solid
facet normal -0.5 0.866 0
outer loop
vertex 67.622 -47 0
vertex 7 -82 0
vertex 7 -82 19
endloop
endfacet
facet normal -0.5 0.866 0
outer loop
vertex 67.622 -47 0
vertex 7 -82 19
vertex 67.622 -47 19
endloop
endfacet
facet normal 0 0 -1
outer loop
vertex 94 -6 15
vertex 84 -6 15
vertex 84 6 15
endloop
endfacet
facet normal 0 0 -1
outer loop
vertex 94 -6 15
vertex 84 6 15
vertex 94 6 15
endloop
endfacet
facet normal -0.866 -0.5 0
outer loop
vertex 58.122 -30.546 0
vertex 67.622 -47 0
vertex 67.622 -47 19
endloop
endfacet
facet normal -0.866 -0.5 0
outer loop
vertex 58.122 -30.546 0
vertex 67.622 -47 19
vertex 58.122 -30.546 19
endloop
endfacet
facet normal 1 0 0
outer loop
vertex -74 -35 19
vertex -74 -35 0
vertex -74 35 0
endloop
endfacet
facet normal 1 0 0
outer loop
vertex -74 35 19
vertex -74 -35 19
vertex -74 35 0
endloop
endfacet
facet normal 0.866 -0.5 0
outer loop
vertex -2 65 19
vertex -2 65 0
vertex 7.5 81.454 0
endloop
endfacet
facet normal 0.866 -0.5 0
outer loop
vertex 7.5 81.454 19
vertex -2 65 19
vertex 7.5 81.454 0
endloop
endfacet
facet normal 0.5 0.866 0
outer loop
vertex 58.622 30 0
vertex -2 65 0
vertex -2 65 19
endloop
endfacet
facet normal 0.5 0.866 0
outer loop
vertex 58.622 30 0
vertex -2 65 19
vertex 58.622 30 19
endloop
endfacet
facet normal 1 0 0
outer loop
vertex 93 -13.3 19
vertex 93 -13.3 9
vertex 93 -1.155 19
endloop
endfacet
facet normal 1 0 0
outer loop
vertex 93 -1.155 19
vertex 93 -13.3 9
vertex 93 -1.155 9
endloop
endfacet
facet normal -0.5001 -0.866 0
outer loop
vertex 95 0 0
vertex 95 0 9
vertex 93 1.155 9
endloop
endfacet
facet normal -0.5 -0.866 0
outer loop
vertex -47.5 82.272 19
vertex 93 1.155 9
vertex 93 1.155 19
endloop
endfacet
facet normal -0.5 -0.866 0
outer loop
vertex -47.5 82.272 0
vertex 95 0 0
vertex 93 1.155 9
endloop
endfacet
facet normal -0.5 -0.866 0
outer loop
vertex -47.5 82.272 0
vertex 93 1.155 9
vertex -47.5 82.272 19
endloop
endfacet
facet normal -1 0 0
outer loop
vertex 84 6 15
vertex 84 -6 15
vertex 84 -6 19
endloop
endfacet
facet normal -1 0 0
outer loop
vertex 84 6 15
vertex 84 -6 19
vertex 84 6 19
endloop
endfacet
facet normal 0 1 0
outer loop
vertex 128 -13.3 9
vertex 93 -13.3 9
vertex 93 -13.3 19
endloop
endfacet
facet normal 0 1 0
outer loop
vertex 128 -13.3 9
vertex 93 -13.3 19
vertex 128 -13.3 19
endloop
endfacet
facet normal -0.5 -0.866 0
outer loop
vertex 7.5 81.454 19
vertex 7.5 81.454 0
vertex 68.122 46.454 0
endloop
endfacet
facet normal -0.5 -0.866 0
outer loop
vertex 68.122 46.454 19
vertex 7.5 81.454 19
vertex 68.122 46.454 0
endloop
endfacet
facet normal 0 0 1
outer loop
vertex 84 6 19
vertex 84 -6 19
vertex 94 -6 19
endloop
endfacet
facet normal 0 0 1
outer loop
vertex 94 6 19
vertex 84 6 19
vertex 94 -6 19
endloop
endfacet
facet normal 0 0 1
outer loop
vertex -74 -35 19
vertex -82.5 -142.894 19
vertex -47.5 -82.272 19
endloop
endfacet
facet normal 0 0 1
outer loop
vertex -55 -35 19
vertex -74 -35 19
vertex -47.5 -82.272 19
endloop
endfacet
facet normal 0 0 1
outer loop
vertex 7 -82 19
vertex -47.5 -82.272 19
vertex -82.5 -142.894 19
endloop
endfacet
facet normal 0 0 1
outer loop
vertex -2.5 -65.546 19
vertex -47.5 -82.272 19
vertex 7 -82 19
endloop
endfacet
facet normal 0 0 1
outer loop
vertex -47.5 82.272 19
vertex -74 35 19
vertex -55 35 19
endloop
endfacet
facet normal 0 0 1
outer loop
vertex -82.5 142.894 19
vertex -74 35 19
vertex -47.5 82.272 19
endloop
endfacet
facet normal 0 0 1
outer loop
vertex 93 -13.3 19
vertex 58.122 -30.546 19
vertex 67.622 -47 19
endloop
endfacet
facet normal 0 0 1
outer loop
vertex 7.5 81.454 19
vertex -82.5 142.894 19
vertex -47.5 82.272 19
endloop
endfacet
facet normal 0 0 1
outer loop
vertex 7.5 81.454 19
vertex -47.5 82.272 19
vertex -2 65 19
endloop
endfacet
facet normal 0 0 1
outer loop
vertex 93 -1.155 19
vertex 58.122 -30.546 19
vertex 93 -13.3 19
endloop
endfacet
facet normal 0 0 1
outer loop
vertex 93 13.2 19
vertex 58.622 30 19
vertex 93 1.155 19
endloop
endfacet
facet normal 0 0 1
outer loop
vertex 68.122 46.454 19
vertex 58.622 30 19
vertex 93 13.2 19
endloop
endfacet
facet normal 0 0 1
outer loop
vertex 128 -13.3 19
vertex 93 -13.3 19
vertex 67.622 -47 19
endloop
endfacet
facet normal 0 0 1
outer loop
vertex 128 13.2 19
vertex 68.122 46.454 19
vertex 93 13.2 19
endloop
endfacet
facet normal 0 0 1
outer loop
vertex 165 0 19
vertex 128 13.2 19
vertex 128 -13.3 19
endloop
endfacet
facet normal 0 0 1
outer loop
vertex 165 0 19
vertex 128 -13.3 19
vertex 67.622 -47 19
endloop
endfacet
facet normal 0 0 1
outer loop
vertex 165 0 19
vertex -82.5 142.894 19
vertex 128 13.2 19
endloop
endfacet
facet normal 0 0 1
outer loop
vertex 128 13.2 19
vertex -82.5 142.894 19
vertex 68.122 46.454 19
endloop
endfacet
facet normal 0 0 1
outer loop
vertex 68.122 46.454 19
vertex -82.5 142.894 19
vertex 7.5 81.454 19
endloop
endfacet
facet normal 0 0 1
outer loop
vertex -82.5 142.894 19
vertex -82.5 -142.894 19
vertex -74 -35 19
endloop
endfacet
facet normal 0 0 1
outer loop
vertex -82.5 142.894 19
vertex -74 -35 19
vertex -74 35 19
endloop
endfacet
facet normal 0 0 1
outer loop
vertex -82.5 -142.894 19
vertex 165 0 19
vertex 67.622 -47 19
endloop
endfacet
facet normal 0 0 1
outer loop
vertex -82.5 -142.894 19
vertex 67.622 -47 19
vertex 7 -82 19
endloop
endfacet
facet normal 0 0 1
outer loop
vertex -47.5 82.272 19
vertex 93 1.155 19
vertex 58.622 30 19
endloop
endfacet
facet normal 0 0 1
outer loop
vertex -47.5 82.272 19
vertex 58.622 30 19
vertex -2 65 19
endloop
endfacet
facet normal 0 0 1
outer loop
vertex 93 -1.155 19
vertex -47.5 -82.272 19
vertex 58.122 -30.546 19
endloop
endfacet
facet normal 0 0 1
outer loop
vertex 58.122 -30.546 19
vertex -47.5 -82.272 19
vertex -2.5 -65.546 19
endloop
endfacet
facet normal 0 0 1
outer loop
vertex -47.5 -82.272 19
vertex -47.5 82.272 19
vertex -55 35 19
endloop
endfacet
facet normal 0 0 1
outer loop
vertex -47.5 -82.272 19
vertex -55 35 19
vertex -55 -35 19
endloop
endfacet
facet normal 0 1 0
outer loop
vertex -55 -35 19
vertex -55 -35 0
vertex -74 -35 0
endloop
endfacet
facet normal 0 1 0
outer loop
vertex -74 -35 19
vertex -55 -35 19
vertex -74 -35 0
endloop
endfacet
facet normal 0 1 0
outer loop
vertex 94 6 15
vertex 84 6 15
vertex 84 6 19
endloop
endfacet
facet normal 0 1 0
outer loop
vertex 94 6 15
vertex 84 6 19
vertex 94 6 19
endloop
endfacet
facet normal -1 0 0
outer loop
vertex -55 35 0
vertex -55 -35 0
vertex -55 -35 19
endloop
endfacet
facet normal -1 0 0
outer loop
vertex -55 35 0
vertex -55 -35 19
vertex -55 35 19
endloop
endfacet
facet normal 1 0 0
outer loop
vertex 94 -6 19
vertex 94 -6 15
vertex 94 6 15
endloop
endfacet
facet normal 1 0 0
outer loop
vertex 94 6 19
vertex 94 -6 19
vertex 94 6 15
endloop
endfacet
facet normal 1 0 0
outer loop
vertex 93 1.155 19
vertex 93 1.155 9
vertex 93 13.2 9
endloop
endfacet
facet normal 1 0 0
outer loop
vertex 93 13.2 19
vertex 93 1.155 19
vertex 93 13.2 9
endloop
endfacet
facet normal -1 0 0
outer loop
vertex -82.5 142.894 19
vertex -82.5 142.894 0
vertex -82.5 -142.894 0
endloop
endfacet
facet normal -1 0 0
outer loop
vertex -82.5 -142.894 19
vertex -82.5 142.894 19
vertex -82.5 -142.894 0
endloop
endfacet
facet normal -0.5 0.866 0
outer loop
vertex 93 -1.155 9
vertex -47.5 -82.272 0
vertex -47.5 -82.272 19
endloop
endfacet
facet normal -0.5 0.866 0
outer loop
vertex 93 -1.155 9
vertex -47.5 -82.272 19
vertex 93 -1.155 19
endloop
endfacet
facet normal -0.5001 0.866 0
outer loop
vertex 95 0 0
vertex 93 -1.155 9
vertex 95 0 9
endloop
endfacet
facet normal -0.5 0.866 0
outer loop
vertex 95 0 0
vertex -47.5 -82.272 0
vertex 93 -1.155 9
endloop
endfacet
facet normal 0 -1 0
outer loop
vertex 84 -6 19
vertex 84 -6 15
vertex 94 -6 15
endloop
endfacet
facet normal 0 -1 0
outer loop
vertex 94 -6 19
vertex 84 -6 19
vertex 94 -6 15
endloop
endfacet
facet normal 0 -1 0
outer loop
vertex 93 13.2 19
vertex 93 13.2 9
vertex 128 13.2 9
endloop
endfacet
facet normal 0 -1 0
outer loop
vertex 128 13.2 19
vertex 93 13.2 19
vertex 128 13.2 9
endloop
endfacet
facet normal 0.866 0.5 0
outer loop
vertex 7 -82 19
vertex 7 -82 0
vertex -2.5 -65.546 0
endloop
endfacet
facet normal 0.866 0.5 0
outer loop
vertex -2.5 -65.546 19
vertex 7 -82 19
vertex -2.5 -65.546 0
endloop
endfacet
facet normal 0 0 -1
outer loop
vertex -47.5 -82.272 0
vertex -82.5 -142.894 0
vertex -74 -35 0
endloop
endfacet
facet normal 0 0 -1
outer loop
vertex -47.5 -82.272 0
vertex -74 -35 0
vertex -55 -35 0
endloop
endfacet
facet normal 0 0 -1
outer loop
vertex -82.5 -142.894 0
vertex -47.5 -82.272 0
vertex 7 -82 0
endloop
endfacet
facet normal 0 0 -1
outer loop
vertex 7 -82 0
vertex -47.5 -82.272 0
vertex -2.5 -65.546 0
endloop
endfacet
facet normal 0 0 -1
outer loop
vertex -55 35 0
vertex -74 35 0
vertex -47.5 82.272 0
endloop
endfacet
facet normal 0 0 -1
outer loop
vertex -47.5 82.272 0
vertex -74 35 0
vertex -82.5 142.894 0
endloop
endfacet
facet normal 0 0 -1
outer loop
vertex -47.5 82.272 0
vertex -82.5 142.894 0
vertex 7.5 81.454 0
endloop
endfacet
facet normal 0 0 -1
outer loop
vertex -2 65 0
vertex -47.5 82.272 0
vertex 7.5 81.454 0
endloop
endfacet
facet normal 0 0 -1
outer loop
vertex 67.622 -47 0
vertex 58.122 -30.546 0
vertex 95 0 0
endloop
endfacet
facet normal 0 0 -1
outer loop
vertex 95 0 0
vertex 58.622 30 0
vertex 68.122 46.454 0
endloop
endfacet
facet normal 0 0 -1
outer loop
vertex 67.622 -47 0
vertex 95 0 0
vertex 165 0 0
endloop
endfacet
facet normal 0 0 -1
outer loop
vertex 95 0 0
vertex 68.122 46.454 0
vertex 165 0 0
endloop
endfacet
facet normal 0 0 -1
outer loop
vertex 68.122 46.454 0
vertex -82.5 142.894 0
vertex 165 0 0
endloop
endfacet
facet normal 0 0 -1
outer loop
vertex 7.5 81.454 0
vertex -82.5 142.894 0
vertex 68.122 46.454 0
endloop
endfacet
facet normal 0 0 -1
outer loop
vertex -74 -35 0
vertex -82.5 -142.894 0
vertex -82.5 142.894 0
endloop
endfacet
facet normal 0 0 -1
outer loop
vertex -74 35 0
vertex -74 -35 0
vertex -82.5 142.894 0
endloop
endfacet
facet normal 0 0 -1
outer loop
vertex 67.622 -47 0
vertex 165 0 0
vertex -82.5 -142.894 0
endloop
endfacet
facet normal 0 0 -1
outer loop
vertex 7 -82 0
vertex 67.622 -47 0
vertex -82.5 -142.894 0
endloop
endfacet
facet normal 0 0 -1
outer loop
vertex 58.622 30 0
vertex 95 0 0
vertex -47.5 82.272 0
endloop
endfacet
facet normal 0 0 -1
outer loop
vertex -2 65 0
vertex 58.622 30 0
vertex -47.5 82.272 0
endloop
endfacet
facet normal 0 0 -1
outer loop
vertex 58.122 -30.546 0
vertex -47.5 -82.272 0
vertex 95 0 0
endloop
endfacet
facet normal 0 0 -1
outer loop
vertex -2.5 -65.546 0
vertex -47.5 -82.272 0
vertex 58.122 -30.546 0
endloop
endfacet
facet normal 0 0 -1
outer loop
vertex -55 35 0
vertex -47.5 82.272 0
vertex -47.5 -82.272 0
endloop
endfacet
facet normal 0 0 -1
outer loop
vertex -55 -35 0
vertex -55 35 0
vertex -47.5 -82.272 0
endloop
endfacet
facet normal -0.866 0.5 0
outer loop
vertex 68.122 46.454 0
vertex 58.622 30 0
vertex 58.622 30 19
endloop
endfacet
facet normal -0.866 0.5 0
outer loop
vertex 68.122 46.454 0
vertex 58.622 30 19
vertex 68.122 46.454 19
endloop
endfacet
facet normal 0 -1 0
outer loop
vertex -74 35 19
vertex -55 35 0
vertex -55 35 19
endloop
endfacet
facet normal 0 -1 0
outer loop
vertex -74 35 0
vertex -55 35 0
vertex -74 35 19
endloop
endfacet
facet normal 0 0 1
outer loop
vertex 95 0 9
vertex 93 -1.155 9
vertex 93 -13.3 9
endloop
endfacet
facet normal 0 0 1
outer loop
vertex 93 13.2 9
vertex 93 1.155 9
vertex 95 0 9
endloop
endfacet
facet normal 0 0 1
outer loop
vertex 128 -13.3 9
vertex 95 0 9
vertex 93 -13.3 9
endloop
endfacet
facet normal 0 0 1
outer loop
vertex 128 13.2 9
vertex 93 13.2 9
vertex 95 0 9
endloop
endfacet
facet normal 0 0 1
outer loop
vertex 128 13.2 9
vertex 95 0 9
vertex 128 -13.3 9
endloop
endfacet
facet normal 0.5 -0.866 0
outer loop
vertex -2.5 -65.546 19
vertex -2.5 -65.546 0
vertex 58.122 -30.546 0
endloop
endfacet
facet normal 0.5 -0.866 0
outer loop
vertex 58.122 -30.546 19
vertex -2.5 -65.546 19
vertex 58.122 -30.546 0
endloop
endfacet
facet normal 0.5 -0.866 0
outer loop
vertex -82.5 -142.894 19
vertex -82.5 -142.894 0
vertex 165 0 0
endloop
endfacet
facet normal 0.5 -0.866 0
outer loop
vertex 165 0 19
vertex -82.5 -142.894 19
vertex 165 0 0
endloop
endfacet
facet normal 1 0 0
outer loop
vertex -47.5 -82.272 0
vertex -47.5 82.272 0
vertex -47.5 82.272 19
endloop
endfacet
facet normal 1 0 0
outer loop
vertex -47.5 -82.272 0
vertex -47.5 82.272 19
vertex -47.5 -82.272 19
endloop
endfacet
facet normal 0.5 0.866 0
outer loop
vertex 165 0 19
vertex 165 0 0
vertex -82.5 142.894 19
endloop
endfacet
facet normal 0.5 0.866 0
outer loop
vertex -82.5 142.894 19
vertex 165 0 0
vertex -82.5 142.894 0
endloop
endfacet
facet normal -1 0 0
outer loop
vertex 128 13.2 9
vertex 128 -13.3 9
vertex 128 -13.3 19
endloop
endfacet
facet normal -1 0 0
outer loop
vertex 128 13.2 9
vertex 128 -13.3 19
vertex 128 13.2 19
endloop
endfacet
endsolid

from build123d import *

# Parameters (mm, degrees)
BOX003_W               = 35
BOX003_H               = 26.5
BOX003_DEPTH           = 10
BOX002_W               = 70
BOX002_H               = 19
BOX002_DEPTH           = 19
BOX002_PLACEMENT_ANGLE = 30
BOX001_W               = 70
BOX001_H               = 19
BOX001_DEPTH           = 19
BOX001_PLACEMENT_ANGLE = 90
BOX_W                  = 70
BOX_H                  = 19
BOX_DEPTH              = 19
BOX_PLACEMENT_ANGLE    = 30
PRISM001_DEPTH         = 19
PRISM_DEPTH            = 19
BOX004_W               = 10
BOX004_H               = 12
BOX004_DEPTH           = 4


with BuildPart() as box003:
    # Box003 → Box003 (new body)
    with BuildSketch(Plane(origin=(93, -13.3, 9), x_dir=(1, 0, 0), z_dir=(0, 0, 1))):
        with Locations((17.5, 13.25)):
            Rectangle(BOX003_W, BOX003_H)
    extrude(amount=BOX003_DEPTH)


with BuildPart() as box002:
    # Box002 → Box002 (new body)
    with BuildSketch(Plane.XY):
        with Locations((35, 9.5)):
            Rectangle(BOX002_W, BOX002_H)
    extrude(amount=BOX002_DEPTH)


with BuildPart() as box002_1:
    # Box002 placement: moved
    add(box002.part.moved(Location((7, -82, 0))).rotate(Axis((7, -82, 0), (0, 0, 1)), BOX002_PLACEMENT_ANGLE))


with BuildPart() as box001:
    # Box001 → Box001 (new body)
    with BuildSketch(Plane.XY):
        with Locations((35, 9.5)):
            Rectangle(BOX001_W, BOX001_H)
    extrude(amount=BOX001_DEPTH)


with BuildPart() as box001_1:
    # Box001 placement: moved
    add(box001.part.moved(Location((-55, -35, 0))).rotate(Axis((-55, -35, 0), (0, 0, 1)), BOX001_PLACEMENT_ANGLE))


with BuildPart() as box:
    # Box → Box (new body)
    with BuildSketch(Plane.XY):
        with Locations((35, 9.5)):
            Rectangle(BOX_W, BOX_H)
    extrude(amount=BOX_DEPTH)


with BuildPart() as box_1:
    # Box placement: moved
    add(box.part.moved(Location((-2, 65, 0))).rotate(Axis((-2, 65, 0), (0, 0, -1)), BOX_PLACEMENT_ANGLE))


with BuildPart() as prism001:
    # Prism001 → Prism001 (new body)
    with BuildSketch(Plane.XY):
        Polygon((95, 0), (-47.5, 82.272413), (-47.5, -82.272413), align=None)
    extrude(amount=PRISM001_DEPTH)


with BuildPart() as cut004:
    # Prism → Prism (new body)
    with BuildSketch(Plane.XY):
        Polygon((165, 0), (-82.5, 142.894192), (-82.5, -142.894192), align=None)
    extrude(amount=PRISM_DEPTH)

    # Cut: cut Prism001
    add(prism001.part, mode=Mode.SUBTRACT)

    # Cut001: cut Box
    add(box_1.part, mode=Mode.SUBTRACT)

    # Cut002: cut Box001
    add(box001_1.part, mode=Mode.SUBTRACT)

    # Cut003: cut Box002
    add(box002_1.part, mode=Mode.SUBTRACT)

    # Cut004: cut Box003
    add(box003.part, mode=Mode.SUBTRACT)


with BuildPart() as box004:
    # Box004 → Box004 (new body)
    with BuildSketch(Plane(origin=(84, -6, 15), x_dir=(1, 0, 0), z_dir=(0, 0, 1))):
        with Locations((5, 6)):
            Rectangle(BOX004_W, BOX004_H)
    extrude(amount=BOX004_DEPTH)


solid = Compound([cut004.part, box004.part])
